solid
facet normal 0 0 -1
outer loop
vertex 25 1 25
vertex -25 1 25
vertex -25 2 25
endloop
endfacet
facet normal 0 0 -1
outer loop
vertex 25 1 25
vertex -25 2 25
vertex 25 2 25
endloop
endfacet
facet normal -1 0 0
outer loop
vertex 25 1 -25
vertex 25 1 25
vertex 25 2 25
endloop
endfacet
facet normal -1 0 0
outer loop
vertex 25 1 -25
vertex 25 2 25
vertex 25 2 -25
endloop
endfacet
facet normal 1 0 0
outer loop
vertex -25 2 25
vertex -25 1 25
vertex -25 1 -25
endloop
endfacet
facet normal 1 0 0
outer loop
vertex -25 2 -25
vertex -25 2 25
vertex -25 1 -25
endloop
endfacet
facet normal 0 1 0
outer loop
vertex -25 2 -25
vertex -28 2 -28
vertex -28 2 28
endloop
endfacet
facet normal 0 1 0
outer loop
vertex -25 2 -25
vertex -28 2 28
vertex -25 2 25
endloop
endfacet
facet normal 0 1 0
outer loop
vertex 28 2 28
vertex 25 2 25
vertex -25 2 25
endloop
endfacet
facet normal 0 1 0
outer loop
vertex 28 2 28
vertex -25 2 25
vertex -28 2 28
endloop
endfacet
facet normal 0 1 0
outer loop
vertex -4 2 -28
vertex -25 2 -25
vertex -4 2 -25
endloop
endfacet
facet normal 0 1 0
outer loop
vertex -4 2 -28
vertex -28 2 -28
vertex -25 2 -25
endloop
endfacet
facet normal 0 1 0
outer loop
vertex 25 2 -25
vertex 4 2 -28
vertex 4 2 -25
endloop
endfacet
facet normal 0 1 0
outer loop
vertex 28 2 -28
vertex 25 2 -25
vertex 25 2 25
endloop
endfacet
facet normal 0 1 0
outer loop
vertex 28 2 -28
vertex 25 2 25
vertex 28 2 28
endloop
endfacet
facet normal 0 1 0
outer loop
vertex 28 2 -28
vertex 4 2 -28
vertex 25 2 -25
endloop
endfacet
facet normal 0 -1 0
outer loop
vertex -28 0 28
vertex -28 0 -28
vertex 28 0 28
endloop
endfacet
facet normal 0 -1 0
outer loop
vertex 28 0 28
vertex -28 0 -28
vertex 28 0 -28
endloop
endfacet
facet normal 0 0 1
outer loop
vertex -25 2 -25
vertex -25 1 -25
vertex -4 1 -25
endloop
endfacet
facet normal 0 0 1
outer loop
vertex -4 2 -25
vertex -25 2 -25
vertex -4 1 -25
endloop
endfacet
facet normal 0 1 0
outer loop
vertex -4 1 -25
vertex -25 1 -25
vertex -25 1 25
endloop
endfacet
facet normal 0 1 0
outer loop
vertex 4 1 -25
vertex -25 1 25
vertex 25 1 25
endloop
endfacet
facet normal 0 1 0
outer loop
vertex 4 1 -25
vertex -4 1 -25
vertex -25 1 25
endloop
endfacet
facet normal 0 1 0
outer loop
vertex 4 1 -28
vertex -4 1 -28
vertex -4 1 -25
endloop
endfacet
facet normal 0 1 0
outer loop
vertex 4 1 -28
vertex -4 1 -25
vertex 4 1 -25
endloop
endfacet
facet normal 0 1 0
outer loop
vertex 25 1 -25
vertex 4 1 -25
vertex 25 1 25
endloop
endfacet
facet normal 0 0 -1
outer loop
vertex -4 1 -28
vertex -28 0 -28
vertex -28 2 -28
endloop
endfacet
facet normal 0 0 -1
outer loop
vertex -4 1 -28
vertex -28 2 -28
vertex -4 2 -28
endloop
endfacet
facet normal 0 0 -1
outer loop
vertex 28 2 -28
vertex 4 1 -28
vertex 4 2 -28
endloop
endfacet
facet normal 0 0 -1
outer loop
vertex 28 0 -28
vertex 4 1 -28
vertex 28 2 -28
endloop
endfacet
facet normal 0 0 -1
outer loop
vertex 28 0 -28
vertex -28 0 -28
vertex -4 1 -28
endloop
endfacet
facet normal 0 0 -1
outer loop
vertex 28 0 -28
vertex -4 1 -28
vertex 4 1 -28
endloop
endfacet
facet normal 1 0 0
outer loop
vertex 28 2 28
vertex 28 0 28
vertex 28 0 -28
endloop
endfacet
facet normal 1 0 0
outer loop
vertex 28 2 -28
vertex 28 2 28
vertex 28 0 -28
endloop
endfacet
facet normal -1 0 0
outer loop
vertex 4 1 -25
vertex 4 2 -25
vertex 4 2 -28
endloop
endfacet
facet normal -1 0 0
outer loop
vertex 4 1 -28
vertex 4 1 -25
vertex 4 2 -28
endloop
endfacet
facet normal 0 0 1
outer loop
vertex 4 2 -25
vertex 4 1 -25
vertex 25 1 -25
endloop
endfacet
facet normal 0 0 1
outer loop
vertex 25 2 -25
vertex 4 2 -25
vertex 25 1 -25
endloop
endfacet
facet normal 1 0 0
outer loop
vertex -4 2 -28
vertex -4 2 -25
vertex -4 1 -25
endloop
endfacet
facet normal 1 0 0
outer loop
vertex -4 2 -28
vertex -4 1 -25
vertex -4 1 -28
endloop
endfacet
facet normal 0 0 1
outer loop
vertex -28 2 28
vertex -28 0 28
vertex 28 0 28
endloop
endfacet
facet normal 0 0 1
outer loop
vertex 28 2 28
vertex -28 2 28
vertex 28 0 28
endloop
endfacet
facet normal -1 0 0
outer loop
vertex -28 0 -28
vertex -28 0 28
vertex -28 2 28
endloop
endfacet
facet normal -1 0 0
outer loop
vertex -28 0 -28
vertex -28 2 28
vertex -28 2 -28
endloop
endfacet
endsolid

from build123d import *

# Parameters (mm, degrees)
SKETCH1_W           = 56
SKETCH1_H           = 56
BOSS_EXTRUDE1_DEPTH = 1
SKETCH1_3_W         = 56
SKETCH1_3_H         = 56
SKETCH1_3_W_2       = 50
SKETCH1_3_H_2       = 50
BOSS_EXTRUDE2_DEPTH = 2
SKETCH2_W           = 8
SKETCH2_H           = 19.436412374
CUT_EXTRUDE1_DEPTH  = 1


with BuildPart() as part:
    # Sketch1 → Boss-Extrude1 (new body)
    with BuildSketch(Plane(origin=(0, 0, 0), x_dir=(1, 0, 0), z_dir=(0, 1, 0))):
        Rectangle(SKETCH1_W, SKETCH1_H)
    extrude(amount=BOSS_EXTRUDE1_DEPTH)

    # Sketch1<3> → Boss-Extrude2 (add)
    with BuildSketch(Plane(origin=(0, 0, 0), x_dir=(1, 0, 0), z_dir=(0, 1, 0))):
        Rectangle(SKETCH1_3_W, SKETCH1_3_H)
        Rectangle(SKETCH1_3_W_2, SKETCH1_3_H_2, mode=Mode.SUBTRACT)
    extrude(amount=BOSS_EXTRUDE2_DEPTH)

    # Sketch2 → Cut-Extrude1 (cut)
    with BuildSketch(Plane(origin=(0, 2, 0), x_dir=(1, 0, 0), z_dir=(0, 1, 0))):
        with Locations((0, 31.957312715)):
            Rectangle(SKETCH2_W, SKETCH2_H)
    extrude(amount=-CUT_EXTRUDE1_DEPTH, mode=Mode.SUBTRACT)


solid = part.part
